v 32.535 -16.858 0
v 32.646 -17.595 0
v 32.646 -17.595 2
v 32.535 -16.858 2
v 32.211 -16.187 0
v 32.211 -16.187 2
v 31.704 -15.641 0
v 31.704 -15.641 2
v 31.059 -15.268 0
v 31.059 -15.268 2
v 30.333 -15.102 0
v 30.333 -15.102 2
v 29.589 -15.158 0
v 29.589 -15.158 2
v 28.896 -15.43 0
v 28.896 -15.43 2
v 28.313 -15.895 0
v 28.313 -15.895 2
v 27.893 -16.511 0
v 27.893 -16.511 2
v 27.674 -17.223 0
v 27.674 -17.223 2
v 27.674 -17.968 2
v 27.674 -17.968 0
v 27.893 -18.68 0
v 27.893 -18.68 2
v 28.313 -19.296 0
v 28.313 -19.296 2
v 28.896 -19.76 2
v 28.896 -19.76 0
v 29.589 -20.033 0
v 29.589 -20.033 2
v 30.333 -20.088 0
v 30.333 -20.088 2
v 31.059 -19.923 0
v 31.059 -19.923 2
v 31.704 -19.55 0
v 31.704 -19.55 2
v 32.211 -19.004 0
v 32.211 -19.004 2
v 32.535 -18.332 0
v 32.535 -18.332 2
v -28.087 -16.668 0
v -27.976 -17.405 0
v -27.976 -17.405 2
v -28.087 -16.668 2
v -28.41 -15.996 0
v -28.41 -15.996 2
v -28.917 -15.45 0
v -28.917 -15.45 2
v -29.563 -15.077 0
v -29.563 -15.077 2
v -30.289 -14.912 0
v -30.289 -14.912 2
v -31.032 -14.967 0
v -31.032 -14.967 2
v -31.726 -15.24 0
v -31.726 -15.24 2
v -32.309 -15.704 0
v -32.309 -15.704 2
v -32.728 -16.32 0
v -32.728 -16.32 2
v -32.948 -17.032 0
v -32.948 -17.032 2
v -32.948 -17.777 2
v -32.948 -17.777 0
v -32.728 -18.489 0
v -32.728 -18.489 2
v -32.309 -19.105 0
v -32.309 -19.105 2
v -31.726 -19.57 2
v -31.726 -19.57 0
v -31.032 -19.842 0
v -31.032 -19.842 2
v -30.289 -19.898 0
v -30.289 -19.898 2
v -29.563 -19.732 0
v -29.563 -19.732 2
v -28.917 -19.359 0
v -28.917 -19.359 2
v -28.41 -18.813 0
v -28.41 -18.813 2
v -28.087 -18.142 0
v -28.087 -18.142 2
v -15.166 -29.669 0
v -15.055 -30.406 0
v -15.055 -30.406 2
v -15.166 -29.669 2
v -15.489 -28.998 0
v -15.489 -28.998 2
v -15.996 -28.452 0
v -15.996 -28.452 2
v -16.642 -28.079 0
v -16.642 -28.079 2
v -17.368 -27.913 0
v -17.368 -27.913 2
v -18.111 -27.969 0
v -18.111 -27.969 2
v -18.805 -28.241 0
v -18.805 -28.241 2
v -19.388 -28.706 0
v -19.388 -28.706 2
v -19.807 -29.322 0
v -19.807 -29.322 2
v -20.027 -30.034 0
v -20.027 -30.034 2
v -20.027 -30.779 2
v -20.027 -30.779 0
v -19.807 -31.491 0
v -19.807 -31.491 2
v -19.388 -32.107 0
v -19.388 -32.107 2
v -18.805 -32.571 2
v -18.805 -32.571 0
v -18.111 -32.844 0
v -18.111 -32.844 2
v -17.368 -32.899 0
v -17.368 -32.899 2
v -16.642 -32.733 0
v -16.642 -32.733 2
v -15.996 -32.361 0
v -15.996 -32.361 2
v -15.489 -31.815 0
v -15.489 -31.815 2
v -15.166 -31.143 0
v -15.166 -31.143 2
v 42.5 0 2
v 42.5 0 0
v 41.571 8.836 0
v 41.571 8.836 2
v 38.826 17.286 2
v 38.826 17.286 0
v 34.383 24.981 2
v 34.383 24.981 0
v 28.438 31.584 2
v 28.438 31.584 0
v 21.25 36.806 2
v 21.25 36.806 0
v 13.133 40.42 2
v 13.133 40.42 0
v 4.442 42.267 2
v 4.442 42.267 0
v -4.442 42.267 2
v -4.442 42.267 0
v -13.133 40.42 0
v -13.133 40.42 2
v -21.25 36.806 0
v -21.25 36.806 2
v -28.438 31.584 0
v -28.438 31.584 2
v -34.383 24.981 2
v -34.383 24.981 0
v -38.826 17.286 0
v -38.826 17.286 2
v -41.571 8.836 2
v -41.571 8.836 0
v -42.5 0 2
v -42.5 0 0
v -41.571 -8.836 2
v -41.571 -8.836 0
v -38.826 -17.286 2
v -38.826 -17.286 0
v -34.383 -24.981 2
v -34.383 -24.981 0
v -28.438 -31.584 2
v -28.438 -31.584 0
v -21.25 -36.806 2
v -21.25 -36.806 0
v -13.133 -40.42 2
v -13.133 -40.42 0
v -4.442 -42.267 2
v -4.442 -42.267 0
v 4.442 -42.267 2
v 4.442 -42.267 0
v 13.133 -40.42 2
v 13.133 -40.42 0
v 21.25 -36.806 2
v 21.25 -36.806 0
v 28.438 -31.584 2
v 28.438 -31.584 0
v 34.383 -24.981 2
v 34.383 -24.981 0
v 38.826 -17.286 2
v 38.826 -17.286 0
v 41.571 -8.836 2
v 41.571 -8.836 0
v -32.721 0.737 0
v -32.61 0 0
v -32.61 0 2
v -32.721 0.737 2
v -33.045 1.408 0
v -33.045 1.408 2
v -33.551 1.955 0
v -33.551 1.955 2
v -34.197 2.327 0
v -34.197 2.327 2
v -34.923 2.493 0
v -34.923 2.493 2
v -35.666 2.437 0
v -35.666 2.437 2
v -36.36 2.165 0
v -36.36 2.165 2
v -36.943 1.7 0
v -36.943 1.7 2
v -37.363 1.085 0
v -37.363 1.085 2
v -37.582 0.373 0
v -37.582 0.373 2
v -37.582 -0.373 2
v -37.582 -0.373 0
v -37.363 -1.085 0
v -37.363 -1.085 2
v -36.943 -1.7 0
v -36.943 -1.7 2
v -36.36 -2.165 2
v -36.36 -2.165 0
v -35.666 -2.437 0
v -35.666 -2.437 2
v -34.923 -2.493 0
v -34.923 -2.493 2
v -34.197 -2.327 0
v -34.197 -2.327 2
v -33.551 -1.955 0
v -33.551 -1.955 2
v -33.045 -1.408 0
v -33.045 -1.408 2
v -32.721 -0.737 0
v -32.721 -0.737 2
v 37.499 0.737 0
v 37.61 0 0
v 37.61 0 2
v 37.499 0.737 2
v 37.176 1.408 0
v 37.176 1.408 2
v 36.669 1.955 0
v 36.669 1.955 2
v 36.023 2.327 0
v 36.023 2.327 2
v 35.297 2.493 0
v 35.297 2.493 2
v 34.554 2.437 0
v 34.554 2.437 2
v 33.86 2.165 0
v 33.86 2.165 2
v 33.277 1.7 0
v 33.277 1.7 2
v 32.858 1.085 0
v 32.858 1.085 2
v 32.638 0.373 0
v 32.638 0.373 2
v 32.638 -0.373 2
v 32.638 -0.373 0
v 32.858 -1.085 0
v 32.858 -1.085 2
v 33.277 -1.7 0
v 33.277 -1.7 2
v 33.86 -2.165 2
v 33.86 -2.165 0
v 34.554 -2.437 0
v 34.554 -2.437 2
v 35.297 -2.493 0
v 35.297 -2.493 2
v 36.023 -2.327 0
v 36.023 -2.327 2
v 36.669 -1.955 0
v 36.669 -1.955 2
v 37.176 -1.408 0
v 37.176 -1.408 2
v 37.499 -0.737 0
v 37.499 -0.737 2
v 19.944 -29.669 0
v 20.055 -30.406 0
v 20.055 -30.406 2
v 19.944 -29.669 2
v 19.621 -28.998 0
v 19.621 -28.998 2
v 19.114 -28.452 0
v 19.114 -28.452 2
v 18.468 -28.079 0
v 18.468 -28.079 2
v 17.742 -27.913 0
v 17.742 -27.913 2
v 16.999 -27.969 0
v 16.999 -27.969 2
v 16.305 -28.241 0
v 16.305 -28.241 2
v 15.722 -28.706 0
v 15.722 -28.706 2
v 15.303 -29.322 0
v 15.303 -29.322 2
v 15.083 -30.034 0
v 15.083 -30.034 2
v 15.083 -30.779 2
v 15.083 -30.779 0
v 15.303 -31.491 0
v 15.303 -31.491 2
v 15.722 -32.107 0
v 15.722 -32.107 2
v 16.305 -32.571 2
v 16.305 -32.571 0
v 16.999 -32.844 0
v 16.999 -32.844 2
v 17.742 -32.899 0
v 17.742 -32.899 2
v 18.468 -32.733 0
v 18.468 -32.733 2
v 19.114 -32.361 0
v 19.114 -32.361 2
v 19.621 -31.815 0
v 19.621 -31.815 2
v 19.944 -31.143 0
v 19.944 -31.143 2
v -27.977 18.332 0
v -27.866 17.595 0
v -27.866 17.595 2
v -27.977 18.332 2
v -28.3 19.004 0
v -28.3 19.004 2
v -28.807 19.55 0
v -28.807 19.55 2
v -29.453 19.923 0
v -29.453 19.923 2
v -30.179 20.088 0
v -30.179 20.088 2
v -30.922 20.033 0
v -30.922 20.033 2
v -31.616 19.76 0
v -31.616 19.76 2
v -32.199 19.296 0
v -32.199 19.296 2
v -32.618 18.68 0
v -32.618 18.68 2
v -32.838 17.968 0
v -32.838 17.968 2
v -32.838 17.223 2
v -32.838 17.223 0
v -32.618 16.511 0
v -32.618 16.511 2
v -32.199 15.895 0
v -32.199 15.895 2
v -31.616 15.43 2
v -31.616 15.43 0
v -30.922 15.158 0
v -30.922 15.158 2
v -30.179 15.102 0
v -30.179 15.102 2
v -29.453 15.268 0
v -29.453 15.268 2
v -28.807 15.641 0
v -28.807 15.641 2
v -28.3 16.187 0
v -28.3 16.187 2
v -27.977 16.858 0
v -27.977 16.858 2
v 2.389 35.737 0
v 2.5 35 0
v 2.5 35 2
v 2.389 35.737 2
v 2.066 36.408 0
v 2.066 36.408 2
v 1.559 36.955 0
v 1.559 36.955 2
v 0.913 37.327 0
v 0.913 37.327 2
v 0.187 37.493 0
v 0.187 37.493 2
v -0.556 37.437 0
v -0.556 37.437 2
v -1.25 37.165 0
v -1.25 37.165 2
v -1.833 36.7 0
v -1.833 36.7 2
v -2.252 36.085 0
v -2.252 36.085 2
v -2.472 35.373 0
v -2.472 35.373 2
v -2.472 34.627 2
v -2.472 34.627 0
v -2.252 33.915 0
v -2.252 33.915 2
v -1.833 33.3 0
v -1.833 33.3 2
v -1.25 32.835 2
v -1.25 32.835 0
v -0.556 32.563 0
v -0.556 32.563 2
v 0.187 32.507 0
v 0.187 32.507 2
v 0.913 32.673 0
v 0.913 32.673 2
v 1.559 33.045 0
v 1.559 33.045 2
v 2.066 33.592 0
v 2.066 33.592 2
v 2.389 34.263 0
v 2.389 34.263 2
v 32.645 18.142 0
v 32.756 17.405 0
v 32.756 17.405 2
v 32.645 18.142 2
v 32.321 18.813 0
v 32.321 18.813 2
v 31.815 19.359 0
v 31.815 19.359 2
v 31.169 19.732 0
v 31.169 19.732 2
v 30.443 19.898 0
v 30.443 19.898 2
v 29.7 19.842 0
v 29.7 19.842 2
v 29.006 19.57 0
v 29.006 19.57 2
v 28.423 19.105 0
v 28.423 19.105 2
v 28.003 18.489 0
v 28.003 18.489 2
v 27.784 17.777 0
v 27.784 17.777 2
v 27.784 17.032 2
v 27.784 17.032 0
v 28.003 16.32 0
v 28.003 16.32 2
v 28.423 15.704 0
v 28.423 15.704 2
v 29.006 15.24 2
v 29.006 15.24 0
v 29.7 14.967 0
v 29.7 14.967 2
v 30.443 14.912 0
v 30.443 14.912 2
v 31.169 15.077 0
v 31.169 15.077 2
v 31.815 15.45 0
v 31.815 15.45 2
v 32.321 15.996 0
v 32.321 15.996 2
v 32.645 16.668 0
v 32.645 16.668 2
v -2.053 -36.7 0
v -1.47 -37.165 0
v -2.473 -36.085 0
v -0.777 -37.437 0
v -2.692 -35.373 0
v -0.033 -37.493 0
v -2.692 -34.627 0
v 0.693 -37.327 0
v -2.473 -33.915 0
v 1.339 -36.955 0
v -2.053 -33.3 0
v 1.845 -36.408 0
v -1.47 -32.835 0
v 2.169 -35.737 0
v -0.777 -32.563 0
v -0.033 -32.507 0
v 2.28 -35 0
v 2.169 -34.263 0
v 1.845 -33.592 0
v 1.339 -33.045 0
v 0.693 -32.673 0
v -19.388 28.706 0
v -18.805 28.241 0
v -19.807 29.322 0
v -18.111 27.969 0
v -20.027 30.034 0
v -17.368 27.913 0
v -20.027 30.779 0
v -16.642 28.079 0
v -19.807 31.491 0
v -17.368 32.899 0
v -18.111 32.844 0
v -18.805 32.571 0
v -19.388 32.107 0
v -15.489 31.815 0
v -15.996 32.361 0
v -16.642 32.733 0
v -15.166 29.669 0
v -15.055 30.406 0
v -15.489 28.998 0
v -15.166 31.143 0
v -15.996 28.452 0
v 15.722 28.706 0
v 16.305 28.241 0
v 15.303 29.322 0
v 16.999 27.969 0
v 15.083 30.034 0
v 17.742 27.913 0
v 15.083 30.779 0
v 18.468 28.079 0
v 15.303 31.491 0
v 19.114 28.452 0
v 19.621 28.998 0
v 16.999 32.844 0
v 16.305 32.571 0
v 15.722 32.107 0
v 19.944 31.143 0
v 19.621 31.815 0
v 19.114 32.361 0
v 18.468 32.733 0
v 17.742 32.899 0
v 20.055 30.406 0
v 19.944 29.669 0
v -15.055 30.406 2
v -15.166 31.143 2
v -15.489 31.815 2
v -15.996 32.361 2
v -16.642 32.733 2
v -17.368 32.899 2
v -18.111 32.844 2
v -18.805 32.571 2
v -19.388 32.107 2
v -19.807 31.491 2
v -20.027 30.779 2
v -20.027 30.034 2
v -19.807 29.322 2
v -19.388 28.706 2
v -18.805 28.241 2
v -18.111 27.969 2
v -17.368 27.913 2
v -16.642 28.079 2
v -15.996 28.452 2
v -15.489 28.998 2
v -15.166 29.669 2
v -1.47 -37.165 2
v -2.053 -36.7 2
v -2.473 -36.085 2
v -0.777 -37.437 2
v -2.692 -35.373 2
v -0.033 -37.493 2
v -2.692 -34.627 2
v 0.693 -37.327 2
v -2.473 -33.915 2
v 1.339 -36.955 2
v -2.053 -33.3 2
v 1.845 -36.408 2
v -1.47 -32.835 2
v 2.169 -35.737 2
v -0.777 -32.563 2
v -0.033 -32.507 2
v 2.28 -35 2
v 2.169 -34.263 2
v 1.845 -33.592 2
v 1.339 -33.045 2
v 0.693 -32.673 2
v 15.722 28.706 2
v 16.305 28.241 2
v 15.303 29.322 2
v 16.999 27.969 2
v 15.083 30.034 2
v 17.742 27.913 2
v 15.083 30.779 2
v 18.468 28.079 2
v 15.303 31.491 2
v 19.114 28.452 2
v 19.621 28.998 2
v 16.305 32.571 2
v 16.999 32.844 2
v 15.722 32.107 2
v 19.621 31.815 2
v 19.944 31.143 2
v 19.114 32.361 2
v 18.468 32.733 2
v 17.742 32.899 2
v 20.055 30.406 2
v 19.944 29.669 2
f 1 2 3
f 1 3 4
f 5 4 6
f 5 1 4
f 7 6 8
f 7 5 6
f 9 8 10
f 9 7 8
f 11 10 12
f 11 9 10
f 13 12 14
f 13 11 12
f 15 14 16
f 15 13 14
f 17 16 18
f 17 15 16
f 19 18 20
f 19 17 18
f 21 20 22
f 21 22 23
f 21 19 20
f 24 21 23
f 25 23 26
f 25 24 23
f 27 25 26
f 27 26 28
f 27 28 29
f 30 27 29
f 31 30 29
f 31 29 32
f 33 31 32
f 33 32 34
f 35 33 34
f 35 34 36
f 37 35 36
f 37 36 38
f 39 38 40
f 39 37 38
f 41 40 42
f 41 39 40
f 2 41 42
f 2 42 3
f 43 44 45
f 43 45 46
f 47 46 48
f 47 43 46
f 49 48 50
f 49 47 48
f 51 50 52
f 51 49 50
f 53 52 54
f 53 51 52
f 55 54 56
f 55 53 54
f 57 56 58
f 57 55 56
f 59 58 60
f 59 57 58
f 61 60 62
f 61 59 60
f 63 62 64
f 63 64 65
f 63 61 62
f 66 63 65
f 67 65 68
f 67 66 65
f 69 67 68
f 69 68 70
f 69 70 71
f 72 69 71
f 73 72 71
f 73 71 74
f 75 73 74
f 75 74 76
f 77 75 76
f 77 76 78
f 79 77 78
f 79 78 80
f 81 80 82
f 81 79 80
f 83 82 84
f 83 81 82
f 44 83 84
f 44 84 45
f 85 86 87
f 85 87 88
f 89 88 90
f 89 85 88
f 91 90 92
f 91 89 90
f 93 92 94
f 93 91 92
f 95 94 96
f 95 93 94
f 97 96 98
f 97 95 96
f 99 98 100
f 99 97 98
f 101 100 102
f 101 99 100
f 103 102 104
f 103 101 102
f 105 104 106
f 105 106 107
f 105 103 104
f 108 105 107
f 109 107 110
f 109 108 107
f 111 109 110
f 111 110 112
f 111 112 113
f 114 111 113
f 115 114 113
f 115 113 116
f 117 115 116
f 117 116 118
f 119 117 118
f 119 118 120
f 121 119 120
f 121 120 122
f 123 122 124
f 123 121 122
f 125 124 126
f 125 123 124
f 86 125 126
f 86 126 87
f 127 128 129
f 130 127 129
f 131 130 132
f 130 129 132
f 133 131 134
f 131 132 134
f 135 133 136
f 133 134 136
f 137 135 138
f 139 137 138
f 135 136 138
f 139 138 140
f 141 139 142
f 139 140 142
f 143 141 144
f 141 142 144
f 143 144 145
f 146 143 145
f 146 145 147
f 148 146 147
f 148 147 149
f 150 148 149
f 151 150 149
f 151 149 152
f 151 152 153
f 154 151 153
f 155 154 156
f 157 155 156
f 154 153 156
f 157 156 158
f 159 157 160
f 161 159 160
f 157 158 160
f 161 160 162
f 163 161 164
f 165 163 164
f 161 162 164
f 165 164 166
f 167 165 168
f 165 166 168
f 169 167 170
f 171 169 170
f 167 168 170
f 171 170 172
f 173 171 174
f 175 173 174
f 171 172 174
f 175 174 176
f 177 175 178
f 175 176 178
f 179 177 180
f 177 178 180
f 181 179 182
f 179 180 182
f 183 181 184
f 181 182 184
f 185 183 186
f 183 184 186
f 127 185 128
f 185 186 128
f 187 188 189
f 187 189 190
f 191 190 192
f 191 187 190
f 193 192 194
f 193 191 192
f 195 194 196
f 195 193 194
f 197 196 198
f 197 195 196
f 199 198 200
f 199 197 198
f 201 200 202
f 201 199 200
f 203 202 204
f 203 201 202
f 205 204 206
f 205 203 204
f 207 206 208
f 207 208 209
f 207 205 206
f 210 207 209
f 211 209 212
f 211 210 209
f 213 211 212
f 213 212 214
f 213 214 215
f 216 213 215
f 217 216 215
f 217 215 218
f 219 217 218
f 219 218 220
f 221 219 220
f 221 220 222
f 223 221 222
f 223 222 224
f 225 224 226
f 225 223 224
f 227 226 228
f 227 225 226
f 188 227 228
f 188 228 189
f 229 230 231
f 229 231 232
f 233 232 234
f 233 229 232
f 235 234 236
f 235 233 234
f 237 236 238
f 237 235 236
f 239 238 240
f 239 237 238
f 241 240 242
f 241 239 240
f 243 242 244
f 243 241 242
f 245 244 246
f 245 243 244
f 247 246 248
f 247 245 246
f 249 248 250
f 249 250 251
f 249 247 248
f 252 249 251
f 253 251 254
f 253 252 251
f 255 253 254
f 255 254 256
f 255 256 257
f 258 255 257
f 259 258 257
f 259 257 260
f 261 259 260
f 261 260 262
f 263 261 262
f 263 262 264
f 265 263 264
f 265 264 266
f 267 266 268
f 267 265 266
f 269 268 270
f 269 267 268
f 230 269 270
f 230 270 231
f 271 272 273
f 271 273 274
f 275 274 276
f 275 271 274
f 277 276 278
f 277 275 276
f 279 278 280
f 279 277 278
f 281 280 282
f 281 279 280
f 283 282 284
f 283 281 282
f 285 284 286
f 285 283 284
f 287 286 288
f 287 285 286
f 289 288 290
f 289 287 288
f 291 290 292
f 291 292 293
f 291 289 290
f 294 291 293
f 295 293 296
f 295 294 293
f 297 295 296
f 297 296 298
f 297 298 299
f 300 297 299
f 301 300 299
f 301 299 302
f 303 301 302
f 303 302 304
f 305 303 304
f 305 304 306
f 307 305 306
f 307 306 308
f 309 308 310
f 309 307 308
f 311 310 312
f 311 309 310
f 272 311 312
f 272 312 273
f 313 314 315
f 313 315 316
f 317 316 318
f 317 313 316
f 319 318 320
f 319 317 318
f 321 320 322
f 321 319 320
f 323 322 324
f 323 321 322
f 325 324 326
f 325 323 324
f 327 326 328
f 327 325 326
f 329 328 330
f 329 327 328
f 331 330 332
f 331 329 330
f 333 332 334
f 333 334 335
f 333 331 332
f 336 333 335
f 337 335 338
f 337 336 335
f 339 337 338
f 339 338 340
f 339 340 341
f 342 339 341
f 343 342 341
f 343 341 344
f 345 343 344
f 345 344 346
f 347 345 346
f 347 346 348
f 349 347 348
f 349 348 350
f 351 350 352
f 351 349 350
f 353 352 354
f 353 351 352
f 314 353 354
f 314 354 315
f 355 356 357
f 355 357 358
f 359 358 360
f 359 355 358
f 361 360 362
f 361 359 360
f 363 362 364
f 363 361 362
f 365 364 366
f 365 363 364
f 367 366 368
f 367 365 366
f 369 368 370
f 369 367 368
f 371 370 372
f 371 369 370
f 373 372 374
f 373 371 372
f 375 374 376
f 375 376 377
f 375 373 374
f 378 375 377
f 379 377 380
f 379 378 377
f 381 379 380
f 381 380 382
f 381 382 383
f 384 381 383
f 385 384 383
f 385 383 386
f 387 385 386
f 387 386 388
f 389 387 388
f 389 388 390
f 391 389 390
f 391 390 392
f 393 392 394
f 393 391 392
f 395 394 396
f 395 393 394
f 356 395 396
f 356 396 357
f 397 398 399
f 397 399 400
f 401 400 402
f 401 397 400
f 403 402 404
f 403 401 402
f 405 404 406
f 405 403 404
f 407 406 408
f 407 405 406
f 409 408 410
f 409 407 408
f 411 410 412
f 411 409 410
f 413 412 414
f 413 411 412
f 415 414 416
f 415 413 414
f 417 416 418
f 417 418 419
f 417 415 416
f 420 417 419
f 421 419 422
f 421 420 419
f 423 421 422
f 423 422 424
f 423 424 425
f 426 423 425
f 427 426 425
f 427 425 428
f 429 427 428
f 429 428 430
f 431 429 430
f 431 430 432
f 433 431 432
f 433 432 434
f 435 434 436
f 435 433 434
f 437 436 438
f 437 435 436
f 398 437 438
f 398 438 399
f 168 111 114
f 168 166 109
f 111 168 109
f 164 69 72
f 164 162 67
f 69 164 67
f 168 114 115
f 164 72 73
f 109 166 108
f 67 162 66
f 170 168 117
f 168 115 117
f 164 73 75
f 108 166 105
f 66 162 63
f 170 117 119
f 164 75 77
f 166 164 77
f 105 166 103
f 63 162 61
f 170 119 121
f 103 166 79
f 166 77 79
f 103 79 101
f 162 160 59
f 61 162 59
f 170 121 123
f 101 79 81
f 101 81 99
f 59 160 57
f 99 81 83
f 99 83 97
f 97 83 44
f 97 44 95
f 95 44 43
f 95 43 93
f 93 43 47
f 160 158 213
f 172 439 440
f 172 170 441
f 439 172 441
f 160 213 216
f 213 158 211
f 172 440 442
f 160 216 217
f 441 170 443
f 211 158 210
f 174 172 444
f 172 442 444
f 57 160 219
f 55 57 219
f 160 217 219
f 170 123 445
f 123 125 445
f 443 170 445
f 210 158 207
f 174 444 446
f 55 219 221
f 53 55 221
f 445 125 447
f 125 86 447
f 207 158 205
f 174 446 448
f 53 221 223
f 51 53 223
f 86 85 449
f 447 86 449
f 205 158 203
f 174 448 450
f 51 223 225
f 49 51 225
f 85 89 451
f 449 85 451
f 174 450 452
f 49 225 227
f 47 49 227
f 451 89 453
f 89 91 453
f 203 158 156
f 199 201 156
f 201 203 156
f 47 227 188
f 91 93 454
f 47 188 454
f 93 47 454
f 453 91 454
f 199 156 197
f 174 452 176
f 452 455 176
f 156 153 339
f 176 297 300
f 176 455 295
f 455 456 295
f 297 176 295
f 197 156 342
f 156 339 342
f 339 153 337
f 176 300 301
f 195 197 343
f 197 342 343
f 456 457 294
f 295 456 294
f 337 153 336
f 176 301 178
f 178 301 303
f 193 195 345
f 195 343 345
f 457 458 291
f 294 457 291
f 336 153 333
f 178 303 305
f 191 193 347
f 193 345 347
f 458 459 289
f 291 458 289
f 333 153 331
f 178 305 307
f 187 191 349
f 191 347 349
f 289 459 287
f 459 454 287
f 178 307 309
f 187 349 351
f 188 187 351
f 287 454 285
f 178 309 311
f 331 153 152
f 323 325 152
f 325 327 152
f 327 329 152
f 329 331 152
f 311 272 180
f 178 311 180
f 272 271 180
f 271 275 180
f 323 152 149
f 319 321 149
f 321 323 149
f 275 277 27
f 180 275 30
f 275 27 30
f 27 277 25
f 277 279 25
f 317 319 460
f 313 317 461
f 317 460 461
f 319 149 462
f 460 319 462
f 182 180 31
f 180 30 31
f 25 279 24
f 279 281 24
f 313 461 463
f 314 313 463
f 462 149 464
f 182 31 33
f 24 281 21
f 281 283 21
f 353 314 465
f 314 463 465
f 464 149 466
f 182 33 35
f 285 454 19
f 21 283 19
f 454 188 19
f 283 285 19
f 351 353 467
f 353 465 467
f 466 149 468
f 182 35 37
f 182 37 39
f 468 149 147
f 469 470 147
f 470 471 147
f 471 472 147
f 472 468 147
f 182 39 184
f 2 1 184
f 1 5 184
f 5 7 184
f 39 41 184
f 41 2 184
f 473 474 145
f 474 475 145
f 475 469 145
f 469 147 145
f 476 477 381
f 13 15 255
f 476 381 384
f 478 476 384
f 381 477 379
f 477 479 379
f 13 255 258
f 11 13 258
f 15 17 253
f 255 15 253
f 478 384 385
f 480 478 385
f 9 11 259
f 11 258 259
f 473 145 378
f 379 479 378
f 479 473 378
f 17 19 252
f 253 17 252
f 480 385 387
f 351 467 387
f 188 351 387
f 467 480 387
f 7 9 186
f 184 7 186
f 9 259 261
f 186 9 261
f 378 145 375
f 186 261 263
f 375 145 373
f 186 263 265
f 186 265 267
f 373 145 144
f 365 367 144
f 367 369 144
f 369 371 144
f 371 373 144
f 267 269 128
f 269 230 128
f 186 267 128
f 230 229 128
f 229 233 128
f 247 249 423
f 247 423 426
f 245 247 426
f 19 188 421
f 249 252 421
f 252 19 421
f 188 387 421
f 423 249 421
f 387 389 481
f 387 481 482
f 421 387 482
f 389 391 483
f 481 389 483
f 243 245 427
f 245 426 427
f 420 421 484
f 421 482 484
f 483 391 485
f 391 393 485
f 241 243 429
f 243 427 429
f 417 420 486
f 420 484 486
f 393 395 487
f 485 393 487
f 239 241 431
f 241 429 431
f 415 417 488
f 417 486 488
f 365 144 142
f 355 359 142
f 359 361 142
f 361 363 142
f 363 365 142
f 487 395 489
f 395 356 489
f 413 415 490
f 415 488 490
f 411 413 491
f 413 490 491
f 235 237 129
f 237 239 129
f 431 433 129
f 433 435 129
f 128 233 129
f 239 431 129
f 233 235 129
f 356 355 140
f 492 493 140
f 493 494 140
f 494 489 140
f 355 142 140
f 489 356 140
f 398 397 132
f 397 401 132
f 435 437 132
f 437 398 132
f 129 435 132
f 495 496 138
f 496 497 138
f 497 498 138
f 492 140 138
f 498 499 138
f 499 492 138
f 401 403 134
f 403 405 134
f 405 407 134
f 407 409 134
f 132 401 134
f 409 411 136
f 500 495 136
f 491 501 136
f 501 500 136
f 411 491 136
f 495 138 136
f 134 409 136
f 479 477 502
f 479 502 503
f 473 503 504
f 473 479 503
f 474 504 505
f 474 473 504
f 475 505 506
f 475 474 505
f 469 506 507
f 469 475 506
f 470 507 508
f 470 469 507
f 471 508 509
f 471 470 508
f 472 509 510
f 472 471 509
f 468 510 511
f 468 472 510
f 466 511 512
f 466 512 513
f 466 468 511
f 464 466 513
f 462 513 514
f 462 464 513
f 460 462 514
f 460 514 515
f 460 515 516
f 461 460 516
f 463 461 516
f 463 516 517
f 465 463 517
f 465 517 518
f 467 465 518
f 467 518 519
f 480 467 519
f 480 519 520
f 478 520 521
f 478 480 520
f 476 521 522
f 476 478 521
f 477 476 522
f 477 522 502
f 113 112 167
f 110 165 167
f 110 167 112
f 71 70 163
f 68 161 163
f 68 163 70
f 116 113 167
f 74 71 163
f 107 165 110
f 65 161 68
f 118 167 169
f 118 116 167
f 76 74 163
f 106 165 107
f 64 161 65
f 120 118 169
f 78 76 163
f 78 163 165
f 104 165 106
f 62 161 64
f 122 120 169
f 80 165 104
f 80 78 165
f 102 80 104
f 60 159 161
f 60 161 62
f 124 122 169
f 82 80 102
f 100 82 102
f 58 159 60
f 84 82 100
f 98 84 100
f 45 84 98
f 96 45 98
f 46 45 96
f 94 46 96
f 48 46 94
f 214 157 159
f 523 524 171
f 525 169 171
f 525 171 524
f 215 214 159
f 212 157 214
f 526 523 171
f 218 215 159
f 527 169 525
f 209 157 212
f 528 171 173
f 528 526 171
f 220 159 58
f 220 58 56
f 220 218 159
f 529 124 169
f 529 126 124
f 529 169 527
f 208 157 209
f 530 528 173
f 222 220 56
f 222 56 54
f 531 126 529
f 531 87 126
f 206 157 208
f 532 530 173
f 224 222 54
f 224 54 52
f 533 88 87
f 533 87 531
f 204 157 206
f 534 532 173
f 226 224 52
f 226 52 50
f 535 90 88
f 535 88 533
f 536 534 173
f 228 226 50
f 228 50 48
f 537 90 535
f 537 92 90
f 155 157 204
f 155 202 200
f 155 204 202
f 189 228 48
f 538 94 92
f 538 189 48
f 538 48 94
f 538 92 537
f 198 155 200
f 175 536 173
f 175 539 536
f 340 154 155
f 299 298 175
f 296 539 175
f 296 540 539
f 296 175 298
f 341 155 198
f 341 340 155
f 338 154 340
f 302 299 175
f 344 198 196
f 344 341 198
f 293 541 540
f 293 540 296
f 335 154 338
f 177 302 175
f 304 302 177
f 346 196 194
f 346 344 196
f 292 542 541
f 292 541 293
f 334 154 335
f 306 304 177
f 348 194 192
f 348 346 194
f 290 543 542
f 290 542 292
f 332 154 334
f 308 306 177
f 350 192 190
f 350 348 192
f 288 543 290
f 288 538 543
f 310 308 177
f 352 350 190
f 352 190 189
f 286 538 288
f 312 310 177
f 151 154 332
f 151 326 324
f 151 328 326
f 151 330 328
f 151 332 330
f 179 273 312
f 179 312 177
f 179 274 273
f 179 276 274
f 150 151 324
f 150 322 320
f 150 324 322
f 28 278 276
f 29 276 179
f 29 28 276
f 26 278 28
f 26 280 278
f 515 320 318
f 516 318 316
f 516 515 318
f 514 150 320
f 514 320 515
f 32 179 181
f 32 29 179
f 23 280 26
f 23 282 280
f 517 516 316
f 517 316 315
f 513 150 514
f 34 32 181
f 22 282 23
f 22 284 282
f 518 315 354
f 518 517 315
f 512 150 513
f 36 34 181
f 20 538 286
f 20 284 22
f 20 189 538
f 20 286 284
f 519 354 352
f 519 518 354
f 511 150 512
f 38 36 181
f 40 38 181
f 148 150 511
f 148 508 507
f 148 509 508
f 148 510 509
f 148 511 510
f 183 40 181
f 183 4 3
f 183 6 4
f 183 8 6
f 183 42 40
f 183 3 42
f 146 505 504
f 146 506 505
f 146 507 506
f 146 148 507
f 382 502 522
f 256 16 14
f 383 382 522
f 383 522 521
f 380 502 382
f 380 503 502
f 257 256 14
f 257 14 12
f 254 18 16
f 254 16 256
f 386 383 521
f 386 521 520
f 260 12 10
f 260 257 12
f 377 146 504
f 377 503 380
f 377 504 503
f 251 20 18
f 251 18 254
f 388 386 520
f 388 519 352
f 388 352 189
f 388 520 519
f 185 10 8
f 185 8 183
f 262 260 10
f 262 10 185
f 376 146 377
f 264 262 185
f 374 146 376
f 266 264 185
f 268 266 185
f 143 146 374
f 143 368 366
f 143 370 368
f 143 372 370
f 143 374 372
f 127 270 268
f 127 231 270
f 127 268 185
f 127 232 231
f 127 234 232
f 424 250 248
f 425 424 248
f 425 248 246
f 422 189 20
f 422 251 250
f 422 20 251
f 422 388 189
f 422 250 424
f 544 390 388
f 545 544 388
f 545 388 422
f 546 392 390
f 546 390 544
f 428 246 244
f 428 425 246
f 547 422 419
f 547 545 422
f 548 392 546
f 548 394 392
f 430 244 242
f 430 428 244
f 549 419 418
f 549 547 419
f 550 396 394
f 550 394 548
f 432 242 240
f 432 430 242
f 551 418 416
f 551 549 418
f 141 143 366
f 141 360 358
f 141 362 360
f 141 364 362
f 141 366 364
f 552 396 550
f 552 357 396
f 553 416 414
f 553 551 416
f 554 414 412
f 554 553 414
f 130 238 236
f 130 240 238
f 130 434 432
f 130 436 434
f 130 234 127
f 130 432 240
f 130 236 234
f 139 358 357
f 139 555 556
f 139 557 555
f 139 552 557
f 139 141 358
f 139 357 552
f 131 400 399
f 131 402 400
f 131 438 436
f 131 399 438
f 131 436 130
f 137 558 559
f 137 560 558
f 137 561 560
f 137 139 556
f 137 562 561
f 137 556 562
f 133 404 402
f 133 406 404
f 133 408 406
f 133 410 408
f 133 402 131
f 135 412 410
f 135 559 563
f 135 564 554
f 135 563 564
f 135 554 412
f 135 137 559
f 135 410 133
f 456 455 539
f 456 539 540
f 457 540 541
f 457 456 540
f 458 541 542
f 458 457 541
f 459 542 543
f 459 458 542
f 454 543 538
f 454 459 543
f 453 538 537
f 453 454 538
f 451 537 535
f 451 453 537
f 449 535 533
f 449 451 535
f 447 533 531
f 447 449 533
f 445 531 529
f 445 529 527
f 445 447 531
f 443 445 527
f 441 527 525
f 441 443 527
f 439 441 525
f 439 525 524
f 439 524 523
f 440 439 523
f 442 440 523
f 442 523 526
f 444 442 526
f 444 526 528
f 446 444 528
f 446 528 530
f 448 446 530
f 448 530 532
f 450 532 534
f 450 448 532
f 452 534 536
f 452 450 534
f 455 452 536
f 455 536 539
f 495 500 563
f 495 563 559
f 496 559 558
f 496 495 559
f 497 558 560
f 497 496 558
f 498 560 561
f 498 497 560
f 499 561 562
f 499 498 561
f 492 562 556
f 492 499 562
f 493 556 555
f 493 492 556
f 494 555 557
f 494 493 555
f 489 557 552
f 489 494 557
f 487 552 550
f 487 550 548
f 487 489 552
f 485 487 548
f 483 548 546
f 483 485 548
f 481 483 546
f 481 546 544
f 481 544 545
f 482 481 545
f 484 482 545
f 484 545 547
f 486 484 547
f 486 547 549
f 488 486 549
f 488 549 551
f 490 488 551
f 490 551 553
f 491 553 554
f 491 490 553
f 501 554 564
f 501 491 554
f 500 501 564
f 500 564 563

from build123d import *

# Parameters (mm, degrees)
F0_R     = 42.5
F0_R_2   = 2.5
F1_DEPTH = 2


with BuildPart() as f1:
    # F0 (on Top) → F1 (new body)
    with BuildSketch(Plane.XY):
        Circle(F0_R)
        with Locations((-0.220217, -35)):
            Circle(F0_R_2, mode=Mode.SUBTRACT)
        with Locations((-17.555054, -30.406246)):
            Circle(F0_R_2, mode=Mode.SUBTRACT)
        with Locations((-30.476052, -17.404643)):
            Circle(F0_R_2, mode=Mode.SUBTRACT)
        with Locations((17.555054, -30.406246)):
            Circle(F0_R_2, mode=Mode.SUBTRACT)
        with Locations((30.145726, -17.595357)):
            Circle(F0_R_2, mode=Mode.SUBTRACT)
        with Locations((-35.110109, 0)):
            Circle(F0_R_2, mode=Mode.SUBTRACT)
        with Locations((-30.365943, 17.595357)):
            Circle(F0_R_2, mode=Mode.SUBTRACT)
        with Locations((-17.555054, 30.406246)):
            Circle(F0_R_2, mode=Mode.SUBTRACT)
        with Locations((35.110109, 0)):
            Circle(F0_R_2, mode=Mode.SUBTRACT)
        with Locations((30.255835, 17.404643)):
            Circle(F0_R_2, mode=Mode.SUBTRACT)
        with Locations((17.555054, 30.406246)):
            Circle(F0_R_2, mode=Mode.SUBTRACT)
        with Locations((0, 35)):
            Circle(F0_R_2, mode=Mode.SUBTRACT)
    extrude(amount=F1_DEPTH)


solid = f1.part
